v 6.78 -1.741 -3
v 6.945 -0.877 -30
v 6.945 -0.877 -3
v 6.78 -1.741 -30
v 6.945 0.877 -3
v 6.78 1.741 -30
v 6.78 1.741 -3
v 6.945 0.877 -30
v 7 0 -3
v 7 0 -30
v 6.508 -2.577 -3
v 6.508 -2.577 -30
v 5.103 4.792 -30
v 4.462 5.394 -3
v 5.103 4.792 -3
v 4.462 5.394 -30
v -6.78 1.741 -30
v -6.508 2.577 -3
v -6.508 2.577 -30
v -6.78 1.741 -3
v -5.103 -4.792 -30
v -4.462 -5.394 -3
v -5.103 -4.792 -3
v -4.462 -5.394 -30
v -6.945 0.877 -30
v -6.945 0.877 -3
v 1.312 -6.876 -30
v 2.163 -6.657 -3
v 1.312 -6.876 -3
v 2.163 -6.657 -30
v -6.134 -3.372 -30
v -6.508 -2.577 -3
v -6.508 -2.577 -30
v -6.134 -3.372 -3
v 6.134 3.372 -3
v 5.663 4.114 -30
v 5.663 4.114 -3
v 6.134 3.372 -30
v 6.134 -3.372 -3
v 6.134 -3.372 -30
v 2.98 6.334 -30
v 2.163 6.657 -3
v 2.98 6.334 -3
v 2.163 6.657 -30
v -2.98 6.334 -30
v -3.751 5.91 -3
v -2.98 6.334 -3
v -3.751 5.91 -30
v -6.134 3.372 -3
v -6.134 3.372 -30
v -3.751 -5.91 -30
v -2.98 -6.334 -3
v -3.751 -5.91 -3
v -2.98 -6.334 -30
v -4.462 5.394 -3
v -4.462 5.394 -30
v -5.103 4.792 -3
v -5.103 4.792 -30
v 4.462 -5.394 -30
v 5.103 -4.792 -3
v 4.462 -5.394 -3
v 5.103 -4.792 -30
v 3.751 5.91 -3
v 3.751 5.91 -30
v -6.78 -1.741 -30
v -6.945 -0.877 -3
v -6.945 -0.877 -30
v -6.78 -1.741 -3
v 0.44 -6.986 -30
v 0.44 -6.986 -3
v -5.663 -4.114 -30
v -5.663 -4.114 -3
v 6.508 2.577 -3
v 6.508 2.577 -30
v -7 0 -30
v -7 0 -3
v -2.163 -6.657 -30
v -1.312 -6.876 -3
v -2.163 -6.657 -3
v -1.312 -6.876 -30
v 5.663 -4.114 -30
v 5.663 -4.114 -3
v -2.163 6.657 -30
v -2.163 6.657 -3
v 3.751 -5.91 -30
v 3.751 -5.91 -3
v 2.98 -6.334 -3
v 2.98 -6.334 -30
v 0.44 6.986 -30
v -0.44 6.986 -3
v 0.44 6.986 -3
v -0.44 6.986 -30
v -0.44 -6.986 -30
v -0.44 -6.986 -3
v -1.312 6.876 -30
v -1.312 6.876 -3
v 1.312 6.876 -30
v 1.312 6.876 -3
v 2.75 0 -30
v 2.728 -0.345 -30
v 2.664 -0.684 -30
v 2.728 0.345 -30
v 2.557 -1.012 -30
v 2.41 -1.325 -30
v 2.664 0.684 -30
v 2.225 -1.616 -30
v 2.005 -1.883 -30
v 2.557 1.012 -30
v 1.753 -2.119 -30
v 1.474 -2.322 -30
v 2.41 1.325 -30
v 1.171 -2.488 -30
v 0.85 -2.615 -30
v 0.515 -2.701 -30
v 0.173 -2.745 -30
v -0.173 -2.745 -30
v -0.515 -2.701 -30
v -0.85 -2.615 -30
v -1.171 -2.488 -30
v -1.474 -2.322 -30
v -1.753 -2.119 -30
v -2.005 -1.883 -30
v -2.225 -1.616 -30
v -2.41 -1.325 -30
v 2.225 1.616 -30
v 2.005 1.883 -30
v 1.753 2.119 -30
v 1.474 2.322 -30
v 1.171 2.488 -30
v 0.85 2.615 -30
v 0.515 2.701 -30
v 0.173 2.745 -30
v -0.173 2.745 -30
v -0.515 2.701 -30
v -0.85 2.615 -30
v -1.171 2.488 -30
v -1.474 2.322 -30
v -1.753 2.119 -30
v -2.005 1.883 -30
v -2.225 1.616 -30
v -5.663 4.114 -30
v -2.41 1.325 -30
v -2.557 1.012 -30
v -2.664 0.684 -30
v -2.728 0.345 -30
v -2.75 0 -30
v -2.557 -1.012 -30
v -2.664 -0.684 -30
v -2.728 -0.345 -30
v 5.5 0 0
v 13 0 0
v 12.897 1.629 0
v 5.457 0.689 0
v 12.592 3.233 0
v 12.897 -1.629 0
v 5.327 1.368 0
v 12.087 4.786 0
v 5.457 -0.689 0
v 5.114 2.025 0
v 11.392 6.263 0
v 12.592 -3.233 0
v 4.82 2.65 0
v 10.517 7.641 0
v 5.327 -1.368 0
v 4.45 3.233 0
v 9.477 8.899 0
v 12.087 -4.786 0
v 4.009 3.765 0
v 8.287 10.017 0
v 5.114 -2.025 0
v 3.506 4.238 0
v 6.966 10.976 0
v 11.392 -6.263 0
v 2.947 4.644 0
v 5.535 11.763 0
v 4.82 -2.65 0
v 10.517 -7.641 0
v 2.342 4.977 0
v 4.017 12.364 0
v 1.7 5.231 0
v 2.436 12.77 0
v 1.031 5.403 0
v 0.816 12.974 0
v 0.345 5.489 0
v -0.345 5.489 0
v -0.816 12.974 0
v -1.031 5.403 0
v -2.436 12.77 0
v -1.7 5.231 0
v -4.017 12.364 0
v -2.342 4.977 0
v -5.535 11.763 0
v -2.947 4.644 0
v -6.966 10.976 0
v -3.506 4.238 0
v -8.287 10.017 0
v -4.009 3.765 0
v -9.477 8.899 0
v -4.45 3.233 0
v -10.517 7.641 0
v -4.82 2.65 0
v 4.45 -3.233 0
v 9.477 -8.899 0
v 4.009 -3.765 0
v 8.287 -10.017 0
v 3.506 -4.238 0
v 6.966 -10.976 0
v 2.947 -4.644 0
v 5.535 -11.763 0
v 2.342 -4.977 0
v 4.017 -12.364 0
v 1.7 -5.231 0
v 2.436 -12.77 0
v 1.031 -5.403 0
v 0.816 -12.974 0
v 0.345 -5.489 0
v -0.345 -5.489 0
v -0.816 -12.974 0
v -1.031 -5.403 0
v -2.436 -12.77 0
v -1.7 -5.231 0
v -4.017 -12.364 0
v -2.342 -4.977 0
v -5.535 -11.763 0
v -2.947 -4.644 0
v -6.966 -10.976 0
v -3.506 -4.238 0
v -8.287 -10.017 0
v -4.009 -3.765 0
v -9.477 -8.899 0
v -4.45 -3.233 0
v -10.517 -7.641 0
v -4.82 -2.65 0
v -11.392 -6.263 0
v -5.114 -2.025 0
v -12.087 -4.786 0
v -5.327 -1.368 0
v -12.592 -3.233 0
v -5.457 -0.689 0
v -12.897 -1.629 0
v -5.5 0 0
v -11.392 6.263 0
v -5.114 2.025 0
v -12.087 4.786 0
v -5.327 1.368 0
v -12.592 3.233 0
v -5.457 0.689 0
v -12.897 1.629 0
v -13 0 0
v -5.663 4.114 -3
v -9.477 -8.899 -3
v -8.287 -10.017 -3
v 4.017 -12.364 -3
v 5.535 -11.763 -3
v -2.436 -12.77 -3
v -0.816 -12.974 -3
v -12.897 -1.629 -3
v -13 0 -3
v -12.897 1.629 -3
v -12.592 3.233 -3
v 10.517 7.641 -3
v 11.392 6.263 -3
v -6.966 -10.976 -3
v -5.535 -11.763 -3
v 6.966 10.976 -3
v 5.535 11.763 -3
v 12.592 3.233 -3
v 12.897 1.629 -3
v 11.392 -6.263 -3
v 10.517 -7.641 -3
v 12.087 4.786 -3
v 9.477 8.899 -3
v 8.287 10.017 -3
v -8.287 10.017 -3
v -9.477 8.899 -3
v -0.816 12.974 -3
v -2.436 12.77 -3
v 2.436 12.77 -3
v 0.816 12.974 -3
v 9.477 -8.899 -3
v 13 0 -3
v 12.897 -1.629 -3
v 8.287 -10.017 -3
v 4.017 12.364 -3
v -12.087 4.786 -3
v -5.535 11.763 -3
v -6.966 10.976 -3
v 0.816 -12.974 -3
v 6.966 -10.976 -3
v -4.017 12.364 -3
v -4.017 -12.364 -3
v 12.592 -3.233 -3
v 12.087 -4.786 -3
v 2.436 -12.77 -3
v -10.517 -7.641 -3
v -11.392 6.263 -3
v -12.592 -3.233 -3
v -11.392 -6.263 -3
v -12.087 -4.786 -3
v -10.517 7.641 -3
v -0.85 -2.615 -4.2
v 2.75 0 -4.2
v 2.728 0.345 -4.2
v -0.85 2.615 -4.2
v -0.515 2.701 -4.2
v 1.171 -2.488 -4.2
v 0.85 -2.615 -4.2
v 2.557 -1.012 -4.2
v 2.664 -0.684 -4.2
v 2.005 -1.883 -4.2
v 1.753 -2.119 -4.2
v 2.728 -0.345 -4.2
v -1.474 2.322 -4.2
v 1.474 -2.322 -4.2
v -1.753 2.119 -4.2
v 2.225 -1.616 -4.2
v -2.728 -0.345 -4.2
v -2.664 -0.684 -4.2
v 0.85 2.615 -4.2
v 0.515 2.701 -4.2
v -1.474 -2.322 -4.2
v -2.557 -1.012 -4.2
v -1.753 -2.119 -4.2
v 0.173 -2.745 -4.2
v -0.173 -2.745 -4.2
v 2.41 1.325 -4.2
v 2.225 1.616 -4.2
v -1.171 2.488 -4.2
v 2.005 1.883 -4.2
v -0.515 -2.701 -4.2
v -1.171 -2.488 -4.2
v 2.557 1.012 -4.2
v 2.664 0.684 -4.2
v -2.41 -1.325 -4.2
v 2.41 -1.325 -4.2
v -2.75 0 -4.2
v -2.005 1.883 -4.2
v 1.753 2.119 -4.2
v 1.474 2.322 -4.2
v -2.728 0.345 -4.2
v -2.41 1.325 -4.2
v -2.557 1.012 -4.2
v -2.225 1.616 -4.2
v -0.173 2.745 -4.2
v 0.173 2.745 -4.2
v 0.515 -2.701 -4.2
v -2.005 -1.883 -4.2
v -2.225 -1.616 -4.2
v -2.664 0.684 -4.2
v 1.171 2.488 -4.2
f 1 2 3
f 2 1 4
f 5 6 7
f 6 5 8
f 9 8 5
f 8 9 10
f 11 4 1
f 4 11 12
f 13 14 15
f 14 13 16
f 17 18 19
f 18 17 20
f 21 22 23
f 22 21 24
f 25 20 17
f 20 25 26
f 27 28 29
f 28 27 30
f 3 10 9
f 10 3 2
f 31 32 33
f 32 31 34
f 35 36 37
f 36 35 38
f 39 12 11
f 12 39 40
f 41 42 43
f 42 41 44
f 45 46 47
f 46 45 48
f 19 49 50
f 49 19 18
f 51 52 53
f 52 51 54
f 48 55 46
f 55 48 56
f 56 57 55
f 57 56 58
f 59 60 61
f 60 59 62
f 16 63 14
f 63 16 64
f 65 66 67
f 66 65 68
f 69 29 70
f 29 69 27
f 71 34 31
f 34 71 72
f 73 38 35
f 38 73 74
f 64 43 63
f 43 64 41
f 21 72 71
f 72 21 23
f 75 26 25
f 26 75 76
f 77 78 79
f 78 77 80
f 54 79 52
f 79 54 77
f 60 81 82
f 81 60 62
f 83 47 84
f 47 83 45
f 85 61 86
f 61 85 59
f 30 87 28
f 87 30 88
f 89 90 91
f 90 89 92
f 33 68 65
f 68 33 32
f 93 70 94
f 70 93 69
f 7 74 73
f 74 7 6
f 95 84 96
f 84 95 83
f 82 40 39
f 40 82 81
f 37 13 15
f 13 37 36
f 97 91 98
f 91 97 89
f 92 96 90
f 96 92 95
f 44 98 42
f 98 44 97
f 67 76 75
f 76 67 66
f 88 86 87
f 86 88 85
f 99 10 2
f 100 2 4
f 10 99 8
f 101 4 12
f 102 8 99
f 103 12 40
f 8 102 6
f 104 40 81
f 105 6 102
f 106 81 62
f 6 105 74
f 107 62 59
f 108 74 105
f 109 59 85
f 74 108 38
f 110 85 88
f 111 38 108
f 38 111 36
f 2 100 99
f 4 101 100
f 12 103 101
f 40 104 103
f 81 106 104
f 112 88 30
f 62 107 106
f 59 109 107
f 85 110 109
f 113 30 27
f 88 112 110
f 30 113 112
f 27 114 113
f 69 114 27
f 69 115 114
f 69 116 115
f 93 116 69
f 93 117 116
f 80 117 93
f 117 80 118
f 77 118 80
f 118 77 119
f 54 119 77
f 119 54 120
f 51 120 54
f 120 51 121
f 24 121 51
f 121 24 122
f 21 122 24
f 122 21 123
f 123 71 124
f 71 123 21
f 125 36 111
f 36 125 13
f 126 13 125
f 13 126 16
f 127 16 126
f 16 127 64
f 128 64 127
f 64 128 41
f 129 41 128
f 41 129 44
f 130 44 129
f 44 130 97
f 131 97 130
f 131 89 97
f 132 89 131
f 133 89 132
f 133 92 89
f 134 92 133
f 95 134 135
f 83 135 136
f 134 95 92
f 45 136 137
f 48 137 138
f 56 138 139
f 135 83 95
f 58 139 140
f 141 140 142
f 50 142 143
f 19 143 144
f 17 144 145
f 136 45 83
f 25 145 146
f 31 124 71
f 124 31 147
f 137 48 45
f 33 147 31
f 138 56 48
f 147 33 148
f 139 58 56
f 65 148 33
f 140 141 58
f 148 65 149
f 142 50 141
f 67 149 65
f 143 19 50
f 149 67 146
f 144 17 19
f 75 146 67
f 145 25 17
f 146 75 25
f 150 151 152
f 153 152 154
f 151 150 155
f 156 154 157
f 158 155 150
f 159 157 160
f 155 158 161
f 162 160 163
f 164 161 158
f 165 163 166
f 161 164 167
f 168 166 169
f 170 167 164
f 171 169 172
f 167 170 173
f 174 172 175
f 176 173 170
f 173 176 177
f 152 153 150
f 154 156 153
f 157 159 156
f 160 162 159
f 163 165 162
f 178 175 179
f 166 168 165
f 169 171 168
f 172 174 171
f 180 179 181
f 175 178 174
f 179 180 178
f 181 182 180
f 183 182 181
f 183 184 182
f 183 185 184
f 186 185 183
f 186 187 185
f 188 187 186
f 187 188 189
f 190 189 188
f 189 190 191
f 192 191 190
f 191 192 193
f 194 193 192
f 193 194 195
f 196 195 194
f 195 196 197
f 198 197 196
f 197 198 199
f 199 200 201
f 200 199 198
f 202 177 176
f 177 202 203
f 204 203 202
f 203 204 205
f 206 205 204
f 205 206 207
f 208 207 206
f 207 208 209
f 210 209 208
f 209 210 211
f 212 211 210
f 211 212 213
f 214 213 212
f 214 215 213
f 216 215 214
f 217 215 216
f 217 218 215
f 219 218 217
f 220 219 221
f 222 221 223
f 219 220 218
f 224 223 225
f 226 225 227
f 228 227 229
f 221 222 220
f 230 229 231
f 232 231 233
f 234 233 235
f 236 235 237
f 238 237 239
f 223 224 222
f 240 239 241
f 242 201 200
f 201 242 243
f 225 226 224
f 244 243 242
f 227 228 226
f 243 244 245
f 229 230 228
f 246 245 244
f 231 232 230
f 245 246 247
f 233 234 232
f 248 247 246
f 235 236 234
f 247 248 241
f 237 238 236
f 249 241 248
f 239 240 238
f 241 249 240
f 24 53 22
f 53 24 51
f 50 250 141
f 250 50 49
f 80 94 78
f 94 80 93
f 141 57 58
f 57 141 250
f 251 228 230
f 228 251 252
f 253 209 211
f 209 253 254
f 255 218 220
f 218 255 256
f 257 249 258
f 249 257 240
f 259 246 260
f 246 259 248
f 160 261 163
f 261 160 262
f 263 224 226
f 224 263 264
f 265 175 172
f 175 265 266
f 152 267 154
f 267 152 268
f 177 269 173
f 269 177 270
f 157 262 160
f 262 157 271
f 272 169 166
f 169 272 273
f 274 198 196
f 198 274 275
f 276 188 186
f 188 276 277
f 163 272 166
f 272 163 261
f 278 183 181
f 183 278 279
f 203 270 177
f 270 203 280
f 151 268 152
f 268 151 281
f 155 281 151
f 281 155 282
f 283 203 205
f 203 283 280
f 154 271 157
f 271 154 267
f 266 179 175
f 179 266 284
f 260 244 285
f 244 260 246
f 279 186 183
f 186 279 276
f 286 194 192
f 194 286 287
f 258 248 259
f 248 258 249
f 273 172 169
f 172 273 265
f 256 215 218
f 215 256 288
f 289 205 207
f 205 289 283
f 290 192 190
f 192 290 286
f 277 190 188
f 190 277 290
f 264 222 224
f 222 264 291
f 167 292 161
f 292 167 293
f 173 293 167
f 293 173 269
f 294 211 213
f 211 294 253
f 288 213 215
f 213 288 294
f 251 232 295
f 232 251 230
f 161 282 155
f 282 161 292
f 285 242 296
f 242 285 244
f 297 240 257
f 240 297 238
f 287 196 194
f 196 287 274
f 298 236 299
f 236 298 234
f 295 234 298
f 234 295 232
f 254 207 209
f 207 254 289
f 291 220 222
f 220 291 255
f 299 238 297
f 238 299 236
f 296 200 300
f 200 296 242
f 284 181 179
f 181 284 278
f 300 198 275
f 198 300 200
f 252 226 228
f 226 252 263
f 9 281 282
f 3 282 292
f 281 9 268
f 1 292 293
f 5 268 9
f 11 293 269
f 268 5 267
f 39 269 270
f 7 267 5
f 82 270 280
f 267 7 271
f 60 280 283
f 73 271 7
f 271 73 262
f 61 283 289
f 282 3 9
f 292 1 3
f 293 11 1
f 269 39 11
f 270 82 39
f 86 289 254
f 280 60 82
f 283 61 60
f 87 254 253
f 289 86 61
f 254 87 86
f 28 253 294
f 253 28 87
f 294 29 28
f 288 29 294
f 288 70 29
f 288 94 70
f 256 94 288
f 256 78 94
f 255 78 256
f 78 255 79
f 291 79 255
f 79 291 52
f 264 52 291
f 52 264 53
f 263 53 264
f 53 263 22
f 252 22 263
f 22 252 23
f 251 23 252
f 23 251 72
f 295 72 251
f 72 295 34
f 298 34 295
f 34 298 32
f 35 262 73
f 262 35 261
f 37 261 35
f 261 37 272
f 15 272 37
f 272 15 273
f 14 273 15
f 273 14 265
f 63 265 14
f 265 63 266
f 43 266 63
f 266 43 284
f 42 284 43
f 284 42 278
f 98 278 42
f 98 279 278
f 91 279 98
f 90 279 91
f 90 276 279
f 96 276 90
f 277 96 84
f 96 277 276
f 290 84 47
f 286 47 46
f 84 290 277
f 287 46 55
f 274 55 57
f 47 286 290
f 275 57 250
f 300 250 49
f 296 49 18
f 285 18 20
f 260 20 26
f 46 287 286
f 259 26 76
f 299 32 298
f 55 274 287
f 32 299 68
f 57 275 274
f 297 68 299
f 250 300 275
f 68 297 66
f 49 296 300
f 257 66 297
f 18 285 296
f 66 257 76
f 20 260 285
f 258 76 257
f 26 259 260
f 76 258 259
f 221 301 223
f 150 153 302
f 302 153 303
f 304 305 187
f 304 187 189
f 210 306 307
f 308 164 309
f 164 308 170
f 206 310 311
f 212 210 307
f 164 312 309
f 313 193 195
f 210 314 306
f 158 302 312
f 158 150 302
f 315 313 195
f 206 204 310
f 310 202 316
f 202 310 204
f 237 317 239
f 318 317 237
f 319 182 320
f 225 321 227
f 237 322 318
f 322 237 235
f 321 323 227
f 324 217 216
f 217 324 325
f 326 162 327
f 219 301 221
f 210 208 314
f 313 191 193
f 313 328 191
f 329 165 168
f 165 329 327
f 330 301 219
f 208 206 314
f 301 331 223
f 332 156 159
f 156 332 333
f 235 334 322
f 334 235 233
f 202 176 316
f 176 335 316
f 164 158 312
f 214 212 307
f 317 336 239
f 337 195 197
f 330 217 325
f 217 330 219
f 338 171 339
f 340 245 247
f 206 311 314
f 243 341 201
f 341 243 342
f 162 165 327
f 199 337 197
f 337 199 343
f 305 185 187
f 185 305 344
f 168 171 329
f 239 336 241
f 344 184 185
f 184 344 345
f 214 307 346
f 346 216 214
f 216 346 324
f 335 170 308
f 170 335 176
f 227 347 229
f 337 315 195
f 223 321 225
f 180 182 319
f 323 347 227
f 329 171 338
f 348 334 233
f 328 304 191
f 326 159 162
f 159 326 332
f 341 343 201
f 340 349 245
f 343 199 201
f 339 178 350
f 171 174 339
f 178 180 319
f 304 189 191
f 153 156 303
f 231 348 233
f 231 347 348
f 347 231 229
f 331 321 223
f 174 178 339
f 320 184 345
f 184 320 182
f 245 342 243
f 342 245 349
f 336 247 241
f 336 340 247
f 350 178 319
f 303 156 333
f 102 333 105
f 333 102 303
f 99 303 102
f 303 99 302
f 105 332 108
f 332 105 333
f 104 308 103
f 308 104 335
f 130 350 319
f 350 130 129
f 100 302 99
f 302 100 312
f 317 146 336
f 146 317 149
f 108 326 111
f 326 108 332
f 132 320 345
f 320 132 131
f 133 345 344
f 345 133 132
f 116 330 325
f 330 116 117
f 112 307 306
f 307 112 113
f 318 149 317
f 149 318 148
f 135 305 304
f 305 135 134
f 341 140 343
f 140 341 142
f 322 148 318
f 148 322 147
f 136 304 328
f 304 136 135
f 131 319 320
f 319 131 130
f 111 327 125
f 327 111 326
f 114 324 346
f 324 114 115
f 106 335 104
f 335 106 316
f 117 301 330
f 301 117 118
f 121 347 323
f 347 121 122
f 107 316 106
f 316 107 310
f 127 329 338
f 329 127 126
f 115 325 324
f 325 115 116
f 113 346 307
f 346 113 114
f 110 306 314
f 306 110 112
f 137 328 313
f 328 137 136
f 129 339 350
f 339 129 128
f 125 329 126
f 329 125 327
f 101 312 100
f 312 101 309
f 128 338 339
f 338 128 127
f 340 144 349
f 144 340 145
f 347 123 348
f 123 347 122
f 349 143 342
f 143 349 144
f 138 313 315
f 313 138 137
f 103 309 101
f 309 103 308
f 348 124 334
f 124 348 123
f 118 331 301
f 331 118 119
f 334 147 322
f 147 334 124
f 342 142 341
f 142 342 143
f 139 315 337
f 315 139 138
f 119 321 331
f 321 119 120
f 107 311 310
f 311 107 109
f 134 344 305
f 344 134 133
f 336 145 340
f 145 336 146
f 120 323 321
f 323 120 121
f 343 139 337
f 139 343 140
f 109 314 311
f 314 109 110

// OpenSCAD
$fn = 50;


difference() {
	union() {
		translate(v = [0, 0, -30.0000000000]) {
			cylinder(h = 30, r = 7.0000000000);
		}
		translate(v = [0, 0, -3.0000000000]) {
			cylinder(h = 3, r = 13.0000000000);
		}
	}
	union() {
		translate(v = [0, 0, 0]) {
			rotate(a = [0, 0, 0]) {
				difference() {
					union() {
						#translate(v = [0, 0, -30.0000000000]) {
							cylinder(h = 30, r = 2.2500000000);
						}
						#translate(v = [0, 0, -4.2000000000]) {
							cylinder(h = 4.2000000000, r = 7.0000000000, r1 = 2.7500000000, r2 = 5.5000000000);
						}
						#translate(v = [0, 0, -30.0000000000]) {
							cylinder(h = 30, r = 2.7500000000);
						}
						#translate(v = [0, 0, -30.0000000000]) {
							cylinder(h = 30, r = 2.2500000000);
						}
					}
					union();
				}
			}
		}
	}
}
